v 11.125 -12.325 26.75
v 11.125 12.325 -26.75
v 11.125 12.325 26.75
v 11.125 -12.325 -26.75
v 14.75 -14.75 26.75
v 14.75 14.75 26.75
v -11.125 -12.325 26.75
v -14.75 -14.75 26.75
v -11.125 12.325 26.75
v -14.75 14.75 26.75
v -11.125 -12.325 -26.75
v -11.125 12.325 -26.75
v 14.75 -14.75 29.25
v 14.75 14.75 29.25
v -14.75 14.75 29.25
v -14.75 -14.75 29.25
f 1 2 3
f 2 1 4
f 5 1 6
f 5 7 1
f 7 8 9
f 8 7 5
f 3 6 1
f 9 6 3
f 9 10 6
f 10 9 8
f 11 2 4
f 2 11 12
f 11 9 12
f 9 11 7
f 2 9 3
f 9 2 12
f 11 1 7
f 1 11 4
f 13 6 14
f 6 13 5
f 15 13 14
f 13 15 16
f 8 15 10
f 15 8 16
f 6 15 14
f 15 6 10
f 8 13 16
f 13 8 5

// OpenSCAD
width=22.25;
length=24.65;
height=53.5;
cap_width=29.5;
cap_height=2.5;

union() {
    cube([width, length, height], center=true);

    translate([0, 0, height/2+cap_height/2])
    cube([cap_width, cap_width, cap_height], center=true);
}
